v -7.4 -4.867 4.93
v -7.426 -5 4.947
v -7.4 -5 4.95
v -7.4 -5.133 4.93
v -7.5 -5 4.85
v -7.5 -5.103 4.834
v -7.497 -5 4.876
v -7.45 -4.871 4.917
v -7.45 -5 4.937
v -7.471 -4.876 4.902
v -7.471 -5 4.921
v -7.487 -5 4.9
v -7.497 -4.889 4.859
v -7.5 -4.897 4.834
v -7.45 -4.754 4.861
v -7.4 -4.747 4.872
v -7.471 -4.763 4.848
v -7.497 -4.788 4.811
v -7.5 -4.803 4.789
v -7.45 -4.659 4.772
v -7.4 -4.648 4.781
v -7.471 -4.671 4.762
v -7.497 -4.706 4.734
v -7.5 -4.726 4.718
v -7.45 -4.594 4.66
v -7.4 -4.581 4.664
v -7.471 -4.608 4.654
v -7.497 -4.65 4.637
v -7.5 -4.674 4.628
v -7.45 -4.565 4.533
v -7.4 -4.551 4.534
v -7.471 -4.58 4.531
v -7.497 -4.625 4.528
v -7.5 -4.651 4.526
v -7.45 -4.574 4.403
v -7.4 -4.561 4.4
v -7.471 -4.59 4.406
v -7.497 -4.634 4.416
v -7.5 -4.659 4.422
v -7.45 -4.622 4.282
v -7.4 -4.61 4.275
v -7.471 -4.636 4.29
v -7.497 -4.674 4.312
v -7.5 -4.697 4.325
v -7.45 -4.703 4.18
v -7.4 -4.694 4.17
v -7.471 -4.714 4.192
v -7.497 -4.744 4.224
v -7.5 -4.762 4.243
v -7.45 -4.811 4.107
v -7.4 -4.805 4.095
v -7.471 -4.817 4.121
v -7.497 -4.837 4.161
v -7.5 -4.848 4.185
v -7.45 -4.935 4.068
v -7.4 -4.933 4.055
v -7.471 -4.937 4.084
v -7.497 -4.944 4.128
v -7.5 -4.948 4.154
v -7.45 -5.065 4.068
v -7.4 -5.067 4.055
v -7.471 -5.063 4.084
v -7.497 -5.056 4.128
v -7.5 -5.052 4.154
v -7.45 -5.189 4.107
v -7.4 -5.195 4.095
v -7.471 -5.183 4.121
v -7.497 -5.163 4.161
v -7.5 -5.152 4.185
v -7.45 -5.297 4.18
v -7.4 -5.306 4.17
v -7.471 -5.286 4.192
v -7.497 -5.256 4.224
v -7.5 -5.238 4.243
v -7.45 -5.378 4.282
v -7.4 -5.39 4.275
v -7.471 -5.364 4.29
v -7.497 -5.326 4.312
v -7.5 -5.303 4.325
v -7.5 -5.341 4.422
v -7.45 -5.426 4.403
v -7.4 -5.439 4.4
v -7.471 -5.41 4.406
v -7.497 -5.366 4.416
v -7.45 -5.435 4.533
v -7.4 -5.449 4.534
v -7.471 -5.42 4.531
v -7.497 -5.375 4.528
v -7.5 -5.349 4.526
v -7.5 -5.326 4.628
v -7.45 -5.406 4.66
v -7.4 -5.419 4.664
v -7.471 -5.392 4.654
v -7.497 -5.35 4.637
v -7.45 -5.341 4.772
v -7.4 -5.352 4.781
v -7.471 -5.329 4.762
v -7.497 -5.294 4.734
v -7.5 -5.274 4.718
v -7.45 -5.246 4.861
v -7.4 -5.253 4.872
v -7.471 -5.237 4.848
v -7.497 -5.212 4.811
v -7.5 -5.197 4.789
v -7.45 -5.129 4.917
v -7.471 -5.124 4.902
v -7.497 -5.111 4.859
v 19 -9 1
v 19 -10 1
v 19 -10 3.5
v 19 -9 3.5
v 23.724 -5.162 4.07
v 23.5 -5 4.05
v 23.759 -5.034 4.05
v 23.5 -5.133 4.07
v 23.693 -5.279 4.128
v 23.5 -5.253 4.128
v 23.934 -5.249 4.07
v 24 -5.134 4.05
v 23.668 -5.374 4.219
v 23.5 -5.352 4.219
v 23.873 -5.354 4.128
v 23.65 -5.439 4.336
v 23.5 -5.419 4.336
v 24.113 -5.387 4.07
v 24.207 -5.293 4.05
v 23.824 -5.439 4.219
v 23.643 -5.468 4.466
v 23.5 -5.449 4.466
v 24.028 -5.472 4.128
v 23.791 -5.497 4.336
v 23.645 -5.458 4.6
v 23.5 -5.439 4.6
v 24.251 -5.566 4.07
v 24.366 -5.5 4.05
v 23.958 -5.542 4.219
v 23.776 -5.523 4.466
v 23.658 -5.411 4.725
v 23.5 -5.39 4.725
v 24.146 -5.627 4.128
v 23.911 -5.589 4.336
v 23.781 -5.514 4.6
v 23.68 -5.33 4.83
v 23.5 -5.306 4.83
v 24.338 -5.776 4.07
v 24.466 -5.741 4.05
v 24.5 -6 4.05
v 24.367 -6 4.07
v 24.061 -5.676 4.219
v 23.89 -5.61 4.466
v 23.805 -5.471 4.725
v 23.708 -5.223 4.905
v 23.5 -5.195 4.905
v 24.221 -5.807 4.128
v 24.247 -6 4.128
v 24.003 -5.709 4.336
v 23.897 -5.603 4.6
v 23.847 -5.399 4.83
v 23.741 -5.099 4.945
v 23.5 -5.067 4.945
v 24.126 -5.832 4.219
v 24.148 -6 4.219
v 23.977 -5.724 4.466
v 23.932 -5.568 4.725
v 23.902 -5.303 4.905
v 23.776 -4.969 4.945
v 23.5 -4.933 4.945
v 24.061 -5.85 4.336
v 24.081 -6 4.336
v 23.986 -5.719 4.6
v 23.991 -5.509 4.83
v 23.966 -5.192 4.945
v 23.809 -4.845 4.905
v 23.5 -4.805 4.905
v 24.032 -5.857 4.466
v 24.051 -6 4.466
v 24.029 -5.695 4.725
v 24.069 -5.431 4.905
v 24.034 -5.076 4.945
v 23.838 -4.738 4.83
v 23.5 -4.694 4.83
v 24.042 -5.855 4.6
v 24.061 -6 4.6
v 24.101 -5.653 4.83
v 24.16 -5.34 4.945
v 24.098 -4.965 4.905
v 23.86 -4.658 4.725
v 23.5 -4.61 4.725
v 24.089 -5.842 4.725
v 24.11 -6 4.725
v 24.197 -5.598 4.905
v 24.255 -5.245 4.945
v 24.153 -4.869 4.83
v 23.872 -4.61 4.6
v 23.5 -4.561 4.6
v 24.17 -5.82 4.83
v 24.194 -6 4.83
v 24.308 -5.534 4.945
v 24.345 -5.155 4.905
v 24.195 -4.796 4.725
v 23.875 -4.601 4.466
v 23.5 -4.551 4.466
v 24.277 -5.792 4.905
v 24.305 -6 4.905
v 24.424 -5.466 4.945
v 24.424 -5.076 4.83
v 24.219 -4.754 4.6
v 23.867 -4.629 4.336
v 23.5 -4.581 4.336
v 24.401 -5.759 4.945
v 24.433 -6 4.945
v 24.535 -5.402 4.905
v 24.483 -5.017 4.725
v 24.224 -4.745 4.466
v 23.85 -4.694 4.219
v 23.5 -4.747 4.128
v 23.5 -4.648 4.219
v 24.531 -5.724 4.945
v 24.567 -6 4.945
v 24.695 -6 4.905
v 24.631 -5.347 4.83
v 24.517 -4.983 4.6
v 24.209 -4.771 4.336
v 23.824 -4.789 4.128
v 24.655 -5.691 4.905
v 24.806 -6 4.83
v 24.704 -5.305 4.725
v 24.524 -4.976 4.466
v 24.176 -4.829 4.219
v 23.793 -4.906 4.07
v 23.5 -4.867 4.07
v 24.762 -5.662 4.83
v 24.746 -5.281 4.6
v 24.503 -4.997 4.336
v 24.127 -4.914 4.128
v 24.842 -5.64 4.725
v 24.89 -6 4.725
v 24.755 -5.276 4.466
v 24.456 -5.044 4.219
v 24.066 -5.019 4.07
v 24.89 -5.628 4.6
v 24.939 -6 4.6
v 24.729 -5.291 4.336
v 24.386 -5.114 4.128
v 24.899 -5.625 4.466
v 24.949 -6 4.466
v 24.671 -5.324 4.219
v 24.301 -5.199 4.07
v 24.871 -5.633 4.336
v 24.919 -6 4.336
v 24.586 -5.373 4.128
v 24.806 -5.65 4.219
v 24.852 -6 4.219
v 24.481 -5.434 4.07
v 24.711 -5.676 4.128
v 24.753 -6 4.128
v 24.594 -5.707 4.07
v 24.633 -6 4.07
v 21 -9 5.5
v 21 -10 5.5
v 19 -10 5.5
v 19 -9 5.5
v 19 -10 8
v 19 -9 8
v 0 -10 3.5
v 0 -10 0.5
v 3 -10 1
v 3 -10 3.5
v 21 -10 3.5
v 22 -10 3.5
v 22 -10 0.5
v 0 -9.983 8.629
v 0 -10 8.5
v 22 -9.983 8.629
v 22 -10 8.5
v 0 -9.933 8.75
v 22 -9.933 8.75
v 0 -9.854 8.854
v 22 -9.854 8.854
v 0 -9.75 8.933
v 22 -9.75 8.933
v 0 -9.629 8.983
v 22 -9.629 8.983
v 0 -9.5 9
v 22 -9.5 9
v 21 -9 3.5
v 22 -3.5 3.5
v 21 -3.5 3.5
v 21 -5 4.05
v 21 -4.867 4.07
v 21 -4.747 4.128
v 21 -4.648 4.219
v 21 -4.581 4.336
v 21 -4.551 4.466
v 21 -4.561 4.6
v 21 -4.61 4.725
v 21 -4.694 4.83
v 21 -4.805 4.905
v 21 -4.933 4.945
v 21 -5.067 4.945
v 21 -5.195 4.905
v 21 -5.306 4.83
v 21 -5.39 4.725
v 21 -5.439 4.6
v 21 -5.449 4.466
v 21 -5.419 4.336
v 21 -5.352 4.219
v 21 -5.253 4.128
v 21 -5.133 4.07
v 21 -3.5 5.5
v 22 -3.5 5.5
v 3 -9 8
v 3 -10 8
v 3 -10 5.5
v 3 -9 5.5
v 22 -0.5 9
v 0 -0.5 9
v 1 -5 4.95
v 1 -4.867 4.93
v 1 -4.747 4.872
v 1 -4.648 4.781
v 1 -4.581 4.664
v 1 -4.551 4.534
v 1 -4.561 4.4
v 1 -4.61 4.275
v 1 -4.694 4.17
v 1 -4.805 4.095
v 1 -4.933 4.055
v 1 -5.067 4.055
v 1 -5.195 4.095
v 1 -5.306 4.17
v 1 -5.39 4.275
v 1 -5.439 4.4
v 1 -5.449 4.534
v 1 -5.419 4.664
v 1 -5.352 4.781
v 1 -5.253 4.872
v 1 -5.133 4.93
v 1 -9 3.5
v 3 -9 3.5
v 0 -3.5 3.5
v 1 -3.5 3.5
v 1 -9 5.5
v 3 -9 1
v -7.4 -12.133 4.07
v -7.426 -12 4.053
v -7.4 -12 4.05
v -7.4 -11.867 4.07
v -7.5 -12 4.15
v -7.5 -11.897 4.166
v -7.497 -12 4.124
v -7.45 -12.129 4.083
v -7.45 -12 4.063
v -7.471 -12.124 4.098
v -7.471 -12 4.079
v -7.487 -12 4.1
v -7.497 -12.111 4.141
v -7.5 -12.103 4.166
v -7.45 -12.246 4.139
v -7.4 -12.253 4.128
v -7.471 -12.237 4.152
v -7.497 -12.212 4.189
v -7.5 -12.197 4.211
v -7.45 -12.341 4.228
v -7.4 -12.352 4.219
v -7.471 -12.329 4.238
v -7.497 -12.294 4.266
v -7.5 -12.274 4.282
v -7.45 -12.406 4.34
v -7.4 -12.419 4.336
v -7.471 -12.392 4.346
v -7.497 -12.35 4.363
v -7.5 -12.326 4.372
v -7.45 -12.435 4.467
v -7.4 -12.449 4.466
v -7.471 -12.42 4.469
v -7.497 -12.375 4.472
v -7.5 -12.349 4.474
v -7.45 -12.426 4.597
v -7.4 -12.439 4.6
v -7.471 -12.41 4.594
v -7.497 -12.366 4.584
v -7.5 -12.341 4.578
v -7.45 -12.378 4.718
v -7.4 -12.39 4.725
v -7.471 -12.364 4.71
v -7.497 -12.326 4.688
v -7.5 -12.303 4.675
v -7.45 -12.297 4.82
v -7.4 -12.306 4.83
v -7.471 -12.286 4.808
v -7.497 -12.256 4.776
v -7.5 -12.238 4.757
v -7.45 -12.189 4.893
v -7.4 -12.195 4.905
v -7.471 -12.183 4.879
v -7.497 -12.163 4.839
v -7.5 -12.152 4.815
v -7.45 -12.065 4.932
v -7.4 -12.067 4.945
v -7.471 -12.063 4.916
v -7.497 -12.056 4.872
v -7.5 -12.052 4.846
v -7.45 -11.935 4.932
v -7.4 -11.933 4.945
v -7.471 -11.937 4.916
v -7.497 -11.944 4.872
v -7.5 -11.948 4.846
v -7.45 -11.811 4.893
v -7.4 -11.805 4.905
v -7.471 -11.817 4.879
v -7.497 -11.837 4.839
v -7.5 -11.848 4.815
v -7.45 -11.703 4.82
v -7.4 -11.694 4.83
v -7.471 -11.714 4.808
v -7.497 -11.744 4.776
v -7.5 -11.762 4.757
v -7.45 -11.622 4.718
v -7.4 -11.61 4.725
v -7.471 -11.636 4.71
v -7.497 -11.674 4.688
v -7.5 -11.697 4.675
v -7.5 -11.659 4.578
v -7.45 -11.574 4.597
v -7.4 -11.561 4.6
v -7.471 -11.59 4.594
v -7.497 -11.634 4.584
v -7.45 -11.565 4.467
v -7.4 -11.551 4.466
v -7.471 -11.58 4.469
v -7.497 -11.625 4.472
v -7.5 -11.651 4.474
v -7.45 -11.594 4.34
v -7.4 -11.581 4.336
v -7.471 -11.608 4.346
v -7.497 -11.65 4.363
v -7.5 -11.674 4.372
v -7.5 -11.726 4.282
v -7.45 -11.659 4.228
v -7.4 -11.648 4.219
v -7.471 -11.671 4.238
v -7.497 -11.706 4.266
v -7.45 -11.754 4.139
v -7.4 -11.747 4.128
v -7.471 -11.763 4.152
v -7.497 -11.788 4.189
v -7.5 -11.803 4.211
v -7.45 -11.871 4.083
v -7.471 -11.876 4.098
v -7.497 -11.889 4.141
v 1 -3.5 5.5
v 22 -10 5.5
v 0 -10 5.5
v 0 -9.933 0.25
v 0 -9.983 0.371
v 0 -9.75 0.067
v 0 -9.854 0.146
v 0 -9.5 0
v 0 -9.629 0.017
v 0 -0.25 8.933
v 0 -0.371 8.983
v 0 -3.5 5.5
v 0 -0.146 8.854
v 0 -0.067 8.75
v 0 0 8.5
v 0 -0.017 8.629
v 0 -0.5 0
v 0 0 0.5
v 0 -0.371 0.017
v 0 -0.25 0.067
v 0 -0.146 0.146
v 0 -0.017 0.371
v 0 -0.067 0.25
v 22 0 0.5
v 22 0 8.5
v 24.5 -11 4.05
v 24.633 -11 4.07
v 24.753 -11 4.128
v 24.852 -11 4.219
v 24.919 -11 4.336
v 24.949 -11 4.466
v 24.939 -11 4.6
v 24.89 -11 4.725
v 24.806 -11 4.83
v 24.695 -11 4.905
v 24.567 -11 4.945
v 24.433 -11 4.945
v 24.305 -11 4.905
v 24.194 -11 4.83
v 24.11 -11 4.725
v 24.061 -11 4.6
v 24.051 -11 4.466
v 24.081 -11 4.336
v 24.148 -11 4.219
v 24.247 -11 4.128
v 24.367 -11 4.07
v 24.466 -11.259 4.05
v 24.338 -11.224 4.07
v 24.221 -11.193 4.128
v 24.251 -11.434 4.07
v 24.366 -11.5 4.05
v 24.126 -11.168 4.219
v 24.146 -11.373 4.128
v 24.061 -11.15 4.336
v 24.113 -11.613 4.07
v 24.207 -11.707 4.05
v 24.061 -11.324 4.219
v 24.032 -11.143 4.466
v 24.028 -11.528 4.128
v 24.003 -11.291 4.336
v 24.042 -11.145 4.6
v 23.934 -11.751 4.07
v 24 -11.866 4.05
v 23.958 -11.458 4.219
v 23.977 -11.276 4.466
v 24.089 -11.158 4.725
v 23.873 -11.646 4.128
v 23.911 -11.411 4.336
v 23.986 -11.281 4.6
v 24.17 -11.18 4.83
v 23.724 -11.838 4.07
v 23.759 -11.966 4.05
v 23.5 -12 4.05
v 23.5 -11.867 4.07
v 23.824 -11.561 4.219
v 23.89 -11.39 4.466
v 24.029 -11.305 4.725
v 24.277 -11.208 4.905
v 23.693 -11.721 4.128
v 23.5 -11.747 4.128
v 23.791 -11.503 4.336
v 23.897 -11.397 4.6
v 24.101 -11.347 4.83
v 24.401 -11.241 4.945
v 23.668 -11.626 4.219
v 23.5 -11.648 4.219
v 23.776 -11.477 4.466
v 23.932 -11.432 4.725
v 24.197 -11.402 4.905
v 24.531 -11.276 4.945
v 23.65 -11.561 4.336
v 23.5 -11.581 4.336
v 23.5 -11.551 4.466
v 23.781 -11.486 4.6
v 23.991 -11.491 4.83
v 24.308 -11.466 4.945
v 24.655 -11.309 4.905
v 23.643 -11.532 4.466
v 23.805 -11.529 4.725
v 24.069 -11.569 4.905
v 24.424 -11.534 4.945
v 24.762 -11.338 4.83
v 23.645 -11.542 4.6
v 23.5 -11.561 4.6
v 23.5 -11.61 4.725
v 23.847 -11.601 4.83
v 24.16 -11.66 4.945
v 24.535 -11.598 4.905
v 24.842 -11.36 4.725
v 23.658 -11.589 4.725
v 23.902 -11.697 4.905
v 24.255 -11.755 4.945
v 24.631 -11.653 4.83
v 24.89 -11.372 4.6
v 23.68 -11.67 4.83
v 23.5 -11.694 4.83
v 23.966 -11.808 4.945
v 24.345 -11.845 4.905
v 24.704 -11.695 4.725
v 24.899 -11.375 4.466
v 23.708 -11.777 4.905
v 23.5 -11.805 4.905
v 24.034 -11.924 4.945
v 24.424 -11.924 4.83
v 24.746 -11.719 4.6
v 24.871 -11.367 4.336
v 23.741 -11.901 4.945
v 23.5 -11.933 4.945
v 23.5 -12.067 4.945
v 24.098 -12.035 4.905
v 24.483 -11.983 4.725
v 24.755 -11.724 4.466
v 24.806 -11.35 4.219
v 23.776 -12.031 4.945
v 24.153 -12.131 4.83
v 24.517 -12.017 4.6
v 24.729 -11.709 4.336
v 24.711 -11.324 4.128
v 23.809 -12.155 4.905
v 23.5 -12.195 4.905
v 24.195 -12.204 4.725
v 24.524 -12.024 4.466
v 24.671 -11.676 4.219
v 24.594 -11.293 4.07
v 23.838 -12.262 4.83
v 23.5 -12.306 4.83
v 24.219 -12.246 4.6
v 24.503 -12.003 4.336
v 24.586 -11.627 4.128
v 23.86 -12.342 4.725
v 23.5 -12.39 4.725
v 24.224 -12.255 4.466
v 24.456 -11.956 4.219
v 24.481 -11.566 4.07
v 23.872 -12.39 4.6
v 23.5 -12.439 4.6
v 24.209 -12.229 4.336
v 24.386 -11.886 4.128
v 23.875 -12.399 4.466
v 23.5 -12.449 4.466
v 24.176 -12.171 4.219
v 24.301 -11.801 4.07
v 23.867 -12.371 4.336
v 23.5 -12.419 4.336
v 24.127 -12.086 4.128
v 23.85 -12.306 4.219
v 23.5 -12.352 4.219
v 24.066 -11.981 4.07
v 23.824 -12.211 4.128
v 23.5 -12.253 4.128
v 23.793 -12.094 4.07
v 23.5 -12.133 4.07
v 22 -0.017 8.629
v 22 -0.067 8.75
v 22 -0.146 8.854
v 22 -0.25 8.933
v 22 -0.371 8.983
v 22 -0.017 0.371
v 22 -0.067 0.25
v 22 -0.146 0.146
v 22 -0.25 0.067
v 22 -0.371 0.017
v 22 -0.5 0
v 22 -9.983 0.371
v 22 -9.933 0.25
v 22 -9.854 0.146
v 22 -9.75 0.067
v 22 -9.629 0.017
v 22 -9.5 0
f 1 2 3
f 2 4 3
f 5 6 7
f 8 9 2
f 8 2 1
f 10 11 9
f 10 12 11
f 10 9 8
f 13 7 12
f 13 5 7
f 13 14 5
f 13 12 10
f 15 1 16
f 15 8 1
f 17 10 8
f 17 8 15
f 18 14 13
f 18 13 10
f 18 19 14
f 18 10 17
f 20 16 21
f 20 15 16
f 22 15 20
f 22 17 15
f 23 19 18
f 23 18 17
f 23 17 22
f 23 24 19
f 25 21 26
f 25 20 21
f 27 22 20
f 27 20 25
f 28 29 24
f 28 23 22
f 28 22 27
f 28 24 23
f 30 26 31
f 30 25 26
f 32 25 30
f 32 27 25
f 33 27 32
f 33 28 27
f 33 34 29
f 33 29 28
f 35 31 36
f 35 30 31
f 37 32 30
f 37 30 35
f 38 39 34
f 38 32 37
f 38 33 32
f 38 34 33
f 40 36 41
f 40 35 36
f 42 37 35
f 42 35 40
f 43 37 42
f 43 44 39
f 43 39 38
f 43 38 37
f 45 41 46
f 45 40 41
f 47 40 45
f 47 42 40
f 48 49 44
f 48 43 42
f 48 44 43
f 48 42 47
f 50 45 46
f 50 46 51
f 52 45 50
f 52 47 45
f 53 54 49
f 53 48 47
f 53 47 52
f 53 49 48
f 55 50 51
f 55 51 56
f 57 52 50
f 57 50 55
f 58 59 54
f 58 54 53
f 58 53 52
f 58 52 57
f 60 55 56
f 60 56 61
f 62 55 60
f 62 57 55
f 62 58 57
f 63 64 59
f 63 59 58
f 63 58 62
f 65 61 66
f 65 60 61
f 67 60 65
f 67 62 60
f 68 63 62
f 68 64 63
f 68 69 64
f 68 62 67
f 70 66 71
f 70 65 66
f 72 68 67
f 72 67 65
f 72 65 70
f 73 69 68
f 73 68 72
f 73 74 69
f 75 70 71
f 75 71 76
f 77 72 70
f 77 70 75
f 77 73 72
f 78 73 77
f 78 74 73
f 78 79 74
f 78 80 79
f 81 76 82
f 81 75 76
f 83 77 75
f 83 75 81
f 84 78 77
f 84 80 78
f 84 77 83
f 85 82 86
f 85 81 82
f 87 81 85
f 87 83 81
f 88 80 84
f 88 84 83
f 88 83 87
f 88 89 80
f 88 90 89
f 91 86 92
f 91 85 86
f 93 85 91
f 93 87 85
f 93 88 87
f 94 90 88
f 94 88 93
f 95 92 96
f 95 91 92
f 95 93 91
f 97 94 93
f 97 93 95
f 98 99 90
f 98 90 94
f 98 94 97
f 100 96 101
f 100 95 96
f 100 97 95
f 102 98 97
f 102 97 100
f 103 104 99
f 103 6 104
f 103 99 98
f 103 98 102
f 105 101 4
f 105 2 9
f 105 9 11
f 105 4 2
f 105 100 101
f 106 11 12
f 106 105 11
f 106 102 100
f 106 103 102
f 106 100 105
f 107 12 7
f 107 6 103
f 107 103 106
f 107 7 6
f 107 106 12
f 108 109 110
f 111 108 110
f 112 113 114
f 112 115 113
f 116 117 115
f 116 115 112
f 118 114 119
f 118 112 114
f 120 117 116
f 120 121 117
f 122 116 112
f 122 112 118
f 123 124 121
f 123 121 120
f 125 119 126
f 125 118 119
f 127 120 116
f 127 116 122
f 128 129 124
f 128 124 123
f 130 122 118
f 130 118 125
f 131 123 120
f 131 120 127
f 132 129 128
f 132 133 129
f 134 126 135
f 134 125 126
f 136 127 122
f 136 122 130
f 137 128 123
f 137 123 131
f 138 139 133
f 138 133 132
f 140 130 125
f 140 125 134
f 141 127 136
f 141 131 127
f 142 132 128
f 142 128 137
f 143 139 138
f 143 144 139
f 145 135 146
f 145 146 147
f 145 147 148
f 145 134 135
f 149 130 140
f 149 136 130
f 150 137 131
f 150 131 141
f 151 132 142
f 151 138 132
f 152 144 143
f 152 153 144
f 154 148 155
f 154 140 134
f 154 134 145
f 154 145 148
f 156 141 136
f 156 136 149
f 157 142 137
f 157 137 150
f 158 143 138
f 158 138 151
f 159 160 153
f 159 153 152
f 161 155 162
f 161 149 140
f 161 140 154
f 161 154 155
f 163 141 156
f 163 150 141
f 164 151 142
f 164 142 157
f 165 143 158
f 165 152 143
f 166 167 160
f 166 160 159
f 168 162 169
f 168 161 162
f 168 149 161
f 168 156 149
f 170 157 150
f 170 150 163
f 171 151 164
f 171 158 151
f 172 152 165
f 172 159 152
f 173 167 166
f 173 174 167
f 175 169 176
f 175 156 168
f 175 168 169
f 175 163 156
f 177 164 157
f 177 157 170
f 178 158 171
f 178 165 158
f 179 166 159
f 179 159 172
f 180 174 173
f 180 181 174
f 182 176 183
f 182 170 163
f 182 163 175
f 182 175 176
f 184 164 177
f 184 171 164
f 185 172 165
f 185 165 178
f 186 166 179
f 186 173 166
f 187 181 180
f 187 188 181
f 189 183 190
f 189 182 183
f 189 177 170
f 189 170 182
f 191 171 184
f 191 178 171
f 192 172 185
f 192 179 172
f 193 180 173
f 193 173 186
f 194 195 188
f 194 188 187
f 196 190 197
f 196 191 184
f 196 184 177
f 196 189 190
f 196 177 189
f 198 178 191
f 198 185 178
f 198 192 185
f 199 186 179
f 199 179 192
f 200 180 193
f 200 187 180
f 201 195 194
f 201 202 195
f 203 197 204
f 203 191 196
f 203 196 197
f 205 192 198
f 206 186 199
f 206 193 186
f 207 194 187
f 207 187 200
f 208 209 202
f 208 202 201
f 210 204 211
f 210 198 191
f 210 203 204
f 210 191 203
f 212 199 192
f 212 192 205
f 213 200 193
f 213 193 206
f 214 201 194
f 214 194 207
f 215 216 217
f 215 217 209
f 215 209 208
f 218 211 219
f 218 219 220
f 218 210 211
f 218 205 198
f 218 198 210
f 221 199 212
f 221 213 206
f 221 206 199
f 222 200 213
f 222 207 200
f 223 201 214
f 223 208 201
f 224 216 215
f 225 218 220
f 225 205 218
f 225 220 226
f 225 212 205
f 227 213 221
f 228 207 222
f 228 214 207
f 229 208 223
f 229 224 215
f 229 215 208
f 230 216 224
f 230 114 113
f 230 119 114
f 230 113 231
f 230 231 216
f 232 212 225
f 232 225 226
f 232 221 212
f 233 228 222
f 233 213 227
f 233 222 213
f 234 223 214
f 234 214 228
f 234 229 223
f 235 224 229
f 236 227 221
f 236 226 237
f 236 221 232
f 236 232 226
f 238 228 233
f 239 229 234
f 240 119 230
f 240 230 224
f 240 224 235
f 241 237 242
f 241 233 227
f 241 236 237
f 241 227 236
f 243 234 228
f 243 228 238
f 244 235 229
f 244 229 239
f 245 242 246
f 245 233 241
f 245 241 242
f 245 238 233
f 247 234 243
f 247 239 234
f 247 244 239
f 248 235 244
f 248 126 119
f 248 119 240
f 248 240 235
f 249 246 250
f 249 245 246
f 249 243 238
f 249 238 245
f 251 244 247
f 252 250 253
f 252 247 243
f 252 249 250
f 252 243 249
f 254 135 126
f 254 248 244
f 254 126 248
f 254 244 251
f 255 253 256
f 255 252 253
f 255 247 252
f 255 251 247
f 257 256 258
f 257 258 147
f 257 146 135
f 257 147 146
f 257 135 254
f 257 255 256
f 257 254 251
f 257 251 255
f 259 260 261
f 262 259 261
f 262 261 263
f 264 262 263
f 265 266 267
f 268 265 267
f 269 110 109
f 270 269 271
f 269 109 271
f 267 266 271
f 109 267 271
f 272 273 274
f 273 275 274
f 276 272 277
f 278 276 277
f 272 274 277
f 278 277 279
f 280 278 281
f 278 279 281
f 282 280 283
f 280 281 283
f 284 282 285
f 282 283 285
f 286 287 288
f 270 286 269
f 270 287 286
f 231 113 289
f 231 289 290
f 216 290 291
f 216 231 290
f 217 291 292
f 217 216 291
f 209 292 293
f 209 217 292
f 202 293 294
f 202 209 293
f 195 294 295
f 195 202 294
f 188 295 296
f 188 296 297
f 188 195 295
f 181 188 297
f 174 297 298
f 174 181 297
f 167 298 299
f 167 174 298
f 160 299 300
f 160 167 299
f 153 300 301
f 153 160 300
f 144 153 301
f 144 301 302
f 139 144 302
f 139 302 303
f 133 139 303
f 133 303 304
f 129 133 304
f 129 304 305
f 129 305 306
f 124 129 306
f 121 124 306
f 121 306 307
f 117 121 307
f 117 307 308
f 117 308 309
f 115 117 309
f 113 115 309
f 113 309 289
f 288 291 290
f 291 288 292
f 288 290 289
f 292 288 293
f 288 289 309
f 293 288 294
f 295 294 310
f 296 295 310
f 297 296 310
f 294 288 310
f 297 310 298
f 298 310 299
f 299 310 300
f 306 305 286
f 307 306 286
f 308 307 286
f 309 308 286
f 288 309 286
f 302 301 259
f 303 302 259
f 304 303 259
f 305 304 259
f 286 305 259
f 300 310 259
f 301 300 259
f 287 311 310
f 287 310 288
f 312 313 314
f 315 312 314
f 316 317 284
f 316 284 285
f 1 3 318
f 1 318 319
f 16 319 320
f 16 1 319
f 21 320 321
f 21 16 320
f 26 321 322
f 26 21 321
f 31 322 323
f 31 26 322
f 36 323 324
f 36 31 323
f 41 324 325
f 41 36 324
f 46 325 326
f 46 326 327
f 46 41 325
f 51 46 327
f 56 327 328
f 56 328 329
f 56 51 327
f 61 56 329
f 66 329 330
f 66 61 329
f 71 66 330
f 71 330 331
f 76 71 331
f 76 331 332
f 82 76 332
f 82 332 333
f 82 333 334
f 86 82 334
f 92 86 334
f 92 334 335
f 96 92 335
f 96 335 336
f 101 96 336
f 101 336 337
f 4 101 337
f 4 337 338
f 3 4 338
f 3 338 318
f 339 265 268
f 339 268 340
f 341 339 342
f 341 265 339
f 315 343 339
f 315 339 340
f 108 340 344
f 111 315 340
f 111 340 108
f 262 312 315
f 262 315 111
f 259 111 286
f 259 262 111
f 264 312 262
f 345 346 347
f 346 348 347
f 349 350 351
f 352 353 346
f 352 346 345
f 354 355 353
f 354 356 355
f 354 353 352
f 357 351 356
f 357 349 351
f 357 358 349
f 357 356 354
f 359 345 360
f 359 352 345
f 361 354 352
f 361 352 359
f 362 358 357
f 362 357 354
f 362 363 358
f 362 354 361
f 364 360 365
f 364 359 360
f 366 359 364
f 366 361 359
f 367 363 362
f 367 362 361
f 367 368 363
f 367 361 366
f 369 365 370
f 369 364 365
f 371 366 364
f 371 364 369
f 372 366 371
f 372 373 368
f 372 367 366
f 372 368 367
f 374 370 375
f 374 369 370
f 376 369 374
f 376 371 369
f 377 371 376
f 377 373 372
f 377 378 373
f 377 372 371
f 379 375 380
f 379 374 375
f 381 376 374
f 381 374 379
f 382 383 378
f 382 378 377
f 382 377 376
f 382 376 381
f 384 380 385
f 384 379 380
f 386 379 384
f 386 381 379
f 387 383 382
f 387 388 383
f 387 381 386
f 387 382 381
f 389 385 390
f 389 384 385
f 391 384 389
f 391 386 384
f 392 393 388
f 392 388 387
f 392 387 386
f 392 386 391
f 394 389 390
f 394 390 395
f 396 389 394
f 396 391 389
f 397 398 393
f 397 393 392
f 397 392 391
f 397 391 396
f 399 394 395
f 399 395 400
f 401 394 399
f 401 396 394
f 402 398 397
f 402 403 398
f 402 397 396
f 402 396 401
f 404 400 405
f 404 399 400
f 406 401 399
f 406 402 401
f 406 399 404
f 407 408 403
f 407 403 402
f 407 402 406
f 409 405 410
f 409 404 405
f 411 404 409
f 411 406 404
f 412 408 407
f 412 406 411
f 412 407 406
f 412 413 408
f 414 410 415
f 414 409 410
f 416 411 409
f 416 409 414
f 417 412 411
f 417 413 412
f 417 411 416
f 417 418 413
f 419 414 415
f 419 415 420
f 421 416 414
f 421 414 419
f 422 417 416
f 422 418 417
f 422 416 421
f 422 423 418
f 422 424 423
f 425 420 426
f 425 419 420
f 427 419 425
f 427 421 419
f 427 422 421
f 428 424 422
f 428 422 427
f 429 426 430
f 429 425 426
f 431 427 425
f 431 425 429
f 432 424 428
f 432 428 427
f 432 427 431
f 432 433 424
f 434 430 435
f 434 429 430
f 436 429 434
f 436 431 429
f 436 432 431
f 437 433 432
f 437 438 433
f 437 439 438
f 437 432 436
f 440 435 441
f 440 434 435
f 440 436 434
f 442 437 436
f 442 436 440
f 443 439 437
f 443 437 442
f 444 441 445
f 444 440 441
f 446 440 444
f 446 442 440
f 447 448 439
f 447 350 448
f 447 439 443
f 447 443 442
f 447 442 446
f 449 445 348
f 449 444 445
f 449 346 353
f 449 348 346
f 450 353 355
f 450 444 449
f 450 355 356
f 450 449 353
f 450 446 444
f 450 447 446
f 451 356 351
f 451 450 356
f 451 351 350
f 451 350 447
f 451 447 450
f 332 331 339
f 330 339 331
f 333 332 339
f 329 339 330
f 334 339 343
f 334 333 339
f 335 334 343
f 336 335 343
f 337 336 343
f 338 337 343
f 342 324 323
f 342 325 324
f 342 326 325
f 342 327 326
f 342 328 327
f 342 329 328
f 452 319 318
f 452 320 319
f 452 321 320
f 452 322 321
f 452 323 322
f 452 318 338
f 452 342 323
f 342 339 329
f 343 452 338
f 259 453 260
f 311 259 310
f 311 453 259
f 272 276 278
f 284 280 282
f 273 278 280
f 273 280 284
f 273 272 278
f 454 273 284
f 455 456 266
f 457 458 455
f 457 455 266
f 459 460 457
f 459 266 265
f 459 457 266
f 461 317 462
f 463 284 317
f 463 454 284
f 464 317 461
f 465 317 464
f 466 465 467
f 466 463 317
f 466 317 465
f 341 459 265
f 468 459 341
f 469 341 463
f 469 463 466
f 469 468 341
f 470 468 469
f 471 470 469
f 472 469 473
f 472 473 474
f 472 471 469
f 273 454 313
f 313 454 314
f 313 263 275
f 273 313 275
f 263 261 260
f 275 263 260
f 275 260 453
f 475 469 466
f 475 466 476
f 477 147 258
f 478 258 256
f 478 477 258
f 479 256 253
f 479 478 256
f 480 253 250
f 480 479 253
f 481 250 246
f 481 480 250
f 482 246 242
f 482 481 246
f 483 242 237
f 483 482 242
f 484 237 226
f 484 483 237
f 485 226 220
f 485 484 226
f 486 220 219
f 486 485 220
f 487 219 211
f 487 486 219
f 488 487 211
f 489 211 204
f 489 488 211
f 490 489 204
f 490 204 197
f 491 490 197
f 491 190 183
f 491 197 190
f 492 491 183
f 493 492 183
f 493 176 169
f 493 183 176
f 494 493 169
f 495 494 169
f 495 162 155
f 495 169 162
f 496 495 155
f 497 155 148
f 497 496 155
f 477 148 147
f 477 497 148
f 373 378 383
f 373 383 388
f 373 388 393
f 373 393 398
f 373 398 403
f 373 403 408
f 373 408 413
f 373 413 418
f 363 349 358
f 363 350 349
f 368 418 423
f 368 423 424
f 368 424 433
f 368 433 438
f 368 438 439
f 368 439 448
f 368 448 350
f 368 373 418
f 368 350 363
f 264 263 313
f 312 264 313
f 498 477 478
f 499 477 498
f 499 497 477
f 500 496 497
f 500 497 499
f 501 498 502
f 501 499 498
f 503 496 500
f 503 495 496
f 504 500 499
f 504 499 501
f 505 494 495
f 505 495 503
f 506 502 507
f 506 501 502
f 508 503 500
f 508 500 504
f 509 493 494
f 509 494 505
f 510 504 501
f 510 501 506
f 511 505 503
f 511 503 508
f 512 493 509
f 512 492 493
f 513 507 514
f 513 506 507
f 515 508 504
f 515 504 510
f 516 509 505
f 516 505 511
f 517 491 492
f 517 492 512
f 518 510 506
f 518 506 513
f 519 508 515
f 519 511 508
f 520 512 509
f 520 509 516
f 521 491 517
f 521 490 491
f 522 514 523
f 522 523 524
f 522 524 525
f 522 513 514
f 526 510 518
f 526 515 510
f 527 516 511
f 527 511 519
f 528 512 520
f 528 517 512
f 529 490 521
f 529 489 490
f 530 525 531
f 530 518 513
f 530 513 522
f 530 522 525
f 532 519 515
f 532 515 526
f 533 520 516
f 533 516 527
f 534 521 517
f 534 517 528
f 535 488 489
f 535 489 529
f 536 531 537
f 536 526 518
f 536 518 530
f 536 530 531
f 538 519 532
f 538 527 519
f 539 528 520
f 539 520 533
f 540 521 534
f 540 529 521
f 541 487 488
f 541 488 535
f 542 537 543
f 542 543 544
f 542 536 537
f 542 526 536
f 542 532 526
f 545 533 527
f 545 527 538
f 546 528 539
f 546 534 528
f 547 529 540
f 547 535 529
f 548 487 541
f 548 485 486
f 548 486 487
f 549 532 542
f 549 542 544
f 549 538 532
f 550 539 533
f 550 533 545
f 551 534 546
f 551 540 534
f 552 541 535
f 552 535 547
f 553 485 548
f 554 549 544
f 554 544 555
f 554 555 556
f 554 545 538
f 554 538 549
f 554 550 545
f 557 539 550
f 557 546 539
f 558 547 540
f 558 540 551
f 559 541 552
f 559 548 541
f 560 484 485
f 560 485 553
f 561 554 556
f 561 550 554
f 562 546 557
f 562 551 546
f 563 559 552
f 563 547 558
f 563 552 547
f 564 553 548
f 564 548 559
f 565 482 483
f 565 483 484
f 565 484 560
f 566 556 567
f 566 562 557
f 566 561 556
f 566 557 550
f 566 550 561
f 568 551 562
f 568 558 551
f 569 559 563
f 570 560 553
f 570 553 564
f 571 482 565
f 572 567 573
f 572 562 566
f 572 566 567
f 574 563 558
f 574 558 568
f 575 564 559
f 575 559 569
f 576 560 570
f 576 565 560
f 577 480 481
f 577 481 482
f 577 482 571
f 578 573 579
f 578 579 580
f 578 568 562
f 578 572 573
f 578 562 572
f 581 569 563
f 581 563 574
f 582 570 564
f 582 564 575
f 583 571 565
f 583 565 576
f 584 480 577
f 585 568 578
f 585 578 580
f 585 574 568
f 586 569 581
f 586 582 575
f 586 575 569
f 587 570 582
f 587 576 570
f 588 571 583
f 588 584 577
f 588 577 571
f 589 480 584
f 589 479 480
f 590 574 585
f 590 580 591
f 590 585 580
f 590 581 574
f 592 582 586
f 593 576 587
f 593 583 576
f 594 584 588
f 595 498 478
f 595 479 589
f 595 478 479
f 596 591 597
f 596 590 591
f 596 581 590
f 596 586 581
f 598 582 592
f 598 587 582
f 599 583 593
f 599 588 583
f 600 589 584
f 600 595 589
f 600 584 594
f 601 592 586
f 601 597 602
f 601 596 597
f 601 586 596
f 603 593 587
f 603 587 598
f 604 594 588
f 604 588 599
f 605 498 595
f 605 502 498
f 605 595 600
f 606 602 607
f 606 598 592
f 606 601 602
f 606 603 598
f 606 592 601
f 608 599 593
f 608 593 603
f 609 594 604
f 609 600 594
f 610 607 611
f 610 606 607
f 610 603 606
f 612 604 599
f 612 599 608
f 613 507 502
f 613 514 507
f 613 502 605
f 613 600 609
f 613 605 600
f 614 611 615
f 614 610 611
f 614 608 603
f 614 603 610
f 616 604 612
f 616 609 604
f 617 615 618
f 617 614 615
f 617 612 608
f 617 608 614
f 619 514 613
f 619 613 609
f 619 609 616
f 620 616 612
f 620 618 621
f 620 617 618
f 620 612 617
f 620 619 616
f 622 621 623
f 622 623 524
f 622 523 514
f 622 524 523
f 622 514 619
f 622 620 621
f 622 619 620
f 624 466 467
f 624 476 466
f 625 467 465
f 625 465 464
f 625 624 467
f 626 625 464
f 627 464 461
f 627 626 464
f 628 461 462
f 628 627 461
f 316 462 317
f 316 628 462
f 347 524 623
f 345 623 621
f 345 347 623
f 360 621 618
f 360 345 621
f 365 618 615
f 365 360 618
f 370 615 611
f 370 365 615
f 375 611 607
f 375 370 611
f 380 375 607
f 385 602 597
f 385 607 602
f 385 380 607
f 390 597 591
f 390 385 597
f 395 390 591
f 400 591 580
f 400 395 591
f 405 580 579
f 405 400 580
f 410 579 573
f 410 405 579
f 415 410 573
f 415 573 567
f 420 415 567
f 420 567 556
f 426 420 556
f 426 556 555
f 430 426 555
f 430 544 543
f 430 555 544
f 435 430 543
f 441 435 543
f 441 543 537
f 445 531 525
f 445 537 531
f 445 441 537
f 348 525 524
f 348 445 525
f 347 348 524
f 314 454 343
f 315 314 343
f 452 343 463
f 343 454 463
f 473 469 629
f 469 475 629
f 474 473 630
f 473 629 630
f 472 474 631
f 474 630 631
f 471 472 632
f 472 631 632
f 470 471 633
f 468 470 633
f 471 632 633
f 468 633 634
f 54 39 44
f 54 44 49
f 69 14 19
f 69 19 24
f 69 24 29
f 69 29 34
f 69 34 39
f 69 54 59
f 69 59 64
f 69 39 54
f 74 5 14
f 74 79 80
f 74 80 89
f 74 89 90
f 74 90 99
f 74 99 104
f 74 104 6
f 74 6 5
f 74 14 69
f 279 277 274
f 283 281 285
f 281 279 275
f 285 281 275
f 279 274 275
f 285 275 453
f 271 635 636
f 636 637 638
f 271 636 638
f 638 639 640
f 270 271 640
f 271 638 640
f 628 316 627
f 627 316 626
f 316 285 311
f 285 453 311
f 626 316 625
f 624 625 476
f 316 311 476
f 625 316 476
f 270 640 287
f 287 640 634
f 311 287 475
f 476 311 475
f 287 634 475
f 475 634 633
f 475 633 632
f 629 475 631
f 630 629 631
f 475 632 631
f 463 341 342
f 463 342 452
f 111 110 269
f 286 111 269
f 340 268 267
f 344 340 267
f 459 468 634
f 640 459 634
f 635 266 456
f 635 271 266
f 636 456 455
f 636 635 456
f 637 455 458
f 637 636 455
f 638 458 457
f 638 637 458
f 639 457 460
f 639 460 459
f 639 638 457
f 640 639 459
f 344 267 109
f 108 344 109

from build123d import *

# Parameters (mm, degrees)
SKETCH1_W           = 22
SKETCH1_H           = 10
BOSS_EXTRUDE1_DEPTH = 9
FILLET2_R           = 0.5
CUT_EXTRUDE4_DEPTH  = 1
SKETCH8_W           = 2
SKETCH8_H           = 6.5
CUT_EXTRUDE5_DEPTH  = 1
CUT_EXTRUDE6_DEPTH  = 1
SKETCH14_R          = 0.45
SKETCH15_R          = 0.45
FILLET4_R           = 0.1


with BuildPart() as part:
    # Sketch1 → Boss-Extrude1 (new body)
    with BuildSketch(Plane.XY):
        with Locations((11, -5)):
            Rectangle(SKETCH1_W, SKETCH1_H)
    extrude(amount=BOSS_EXTRUDE1_DEPTH)

    # Fillet2
    fillet2_edges = [part.edges().sort_by_distance(p)[0] for p in [
        (11, 0, 9),
        (11, 0, 0),
        (11, -10, 0),
        (11, -10, 9),
    ]]
    fillet(fillet2_edges, radius=FILLET2_R)

    # 3DSketch1 → Cut-Extrude4 (cut)
    with BuildSketch(Plane(origin=(22, -10, 5.5), x_dir=(0, 0.9557790087219501, -0.29408584883752314), z_dir=(1, 0, 0))):
        Polygon((0, 0), (6.212563557, 1.911558017), (6.800735254, 0), (0.588171698, -1.911558017), align=None)
    extrude(amount=-CUT_EXTRUDE4_DEPTH, mode=Mode.SUBTRACT)

    # Sketch8 → Cut-Extrude5 (cut)
    with BuildSketch(Plane.ZY):
        with Locations((4.5, -6.75)):
            Rectangle(SKETCH8_W, SKETCH8_H)
    extrude(amount=-CUT_EXTRUDE5_DEPTH, mode=Mode.SUBTRACT)

    # Sketch6 → Cut-Extrude6 (cut)
    with BuildSketch(Plane.XZ.offset(10)):
        Polygon((1, 5.5), (1, 3.5), (3, 3.5), (3, 1), (19, 1), (19, 3.5), (21, 3.5), (21, 5.5), (19, 5.5), (19, 8), (3, 8), (3, 5.5), align=None)
    extrude(amount=-CUT_EXTRUDE6_DEPTH, mode=Mode.SUBTRACT)

    # Sweep2: sweep along a curve in space
    with BuildLine() as sweep2_path:
        Line((21, -5, 4.5), (23.5, -5, 4.5))
        ThreePointArc((24.5, -6, 4.5), (24.207106781, -5.292893219, 4.5), (23.5, -5, 4.5))
        Line((24.5, -6, 4.5), (24.5, -11, 4.5))
        ThreePointArc((23.5, -12, 4.5), (24.207106781, -11.707106781, 4.5), (24.5, -11, 4.5))
        Line((23.5, -12, 4.5), (-7.5, -12, 4.5))
    # Sketch14 → Sweep2 (sweep)
    with BuildSketch(Plane(origin=(21, 0, 0), x_dir=(0, 0, -1), z_dir=(1, 0, 0))):
        with Locations((-4.5, -5)):
            Circle(SKETCH14_R)
    sweep(path=sweep2_path.line)

    # Sweep3: sweep along a curve in space
    with BuildLine() as sweep3_path:
        Line((1, -5, 4.5), (-7.5, -5, 4.5))
    # Sketch15 → Sweep3 (sweep)
    with BuildSketch(Plane.ZY.offset(-1)):
        with Locations((4.5, -5)):
            Circle(SKETCH15_R)
    sweep(path=sweep3_path.line)

    # Fillet4
    fillet4_edges = [part.edges().sort_by_distance(p)[0] for p in [
        (-7.5, -12, 4.95),
        (-7.5, -5, 4.05),
    ]]
    fillet(fillet4_edges, radius=FILLET4_R)


solid = part.part
